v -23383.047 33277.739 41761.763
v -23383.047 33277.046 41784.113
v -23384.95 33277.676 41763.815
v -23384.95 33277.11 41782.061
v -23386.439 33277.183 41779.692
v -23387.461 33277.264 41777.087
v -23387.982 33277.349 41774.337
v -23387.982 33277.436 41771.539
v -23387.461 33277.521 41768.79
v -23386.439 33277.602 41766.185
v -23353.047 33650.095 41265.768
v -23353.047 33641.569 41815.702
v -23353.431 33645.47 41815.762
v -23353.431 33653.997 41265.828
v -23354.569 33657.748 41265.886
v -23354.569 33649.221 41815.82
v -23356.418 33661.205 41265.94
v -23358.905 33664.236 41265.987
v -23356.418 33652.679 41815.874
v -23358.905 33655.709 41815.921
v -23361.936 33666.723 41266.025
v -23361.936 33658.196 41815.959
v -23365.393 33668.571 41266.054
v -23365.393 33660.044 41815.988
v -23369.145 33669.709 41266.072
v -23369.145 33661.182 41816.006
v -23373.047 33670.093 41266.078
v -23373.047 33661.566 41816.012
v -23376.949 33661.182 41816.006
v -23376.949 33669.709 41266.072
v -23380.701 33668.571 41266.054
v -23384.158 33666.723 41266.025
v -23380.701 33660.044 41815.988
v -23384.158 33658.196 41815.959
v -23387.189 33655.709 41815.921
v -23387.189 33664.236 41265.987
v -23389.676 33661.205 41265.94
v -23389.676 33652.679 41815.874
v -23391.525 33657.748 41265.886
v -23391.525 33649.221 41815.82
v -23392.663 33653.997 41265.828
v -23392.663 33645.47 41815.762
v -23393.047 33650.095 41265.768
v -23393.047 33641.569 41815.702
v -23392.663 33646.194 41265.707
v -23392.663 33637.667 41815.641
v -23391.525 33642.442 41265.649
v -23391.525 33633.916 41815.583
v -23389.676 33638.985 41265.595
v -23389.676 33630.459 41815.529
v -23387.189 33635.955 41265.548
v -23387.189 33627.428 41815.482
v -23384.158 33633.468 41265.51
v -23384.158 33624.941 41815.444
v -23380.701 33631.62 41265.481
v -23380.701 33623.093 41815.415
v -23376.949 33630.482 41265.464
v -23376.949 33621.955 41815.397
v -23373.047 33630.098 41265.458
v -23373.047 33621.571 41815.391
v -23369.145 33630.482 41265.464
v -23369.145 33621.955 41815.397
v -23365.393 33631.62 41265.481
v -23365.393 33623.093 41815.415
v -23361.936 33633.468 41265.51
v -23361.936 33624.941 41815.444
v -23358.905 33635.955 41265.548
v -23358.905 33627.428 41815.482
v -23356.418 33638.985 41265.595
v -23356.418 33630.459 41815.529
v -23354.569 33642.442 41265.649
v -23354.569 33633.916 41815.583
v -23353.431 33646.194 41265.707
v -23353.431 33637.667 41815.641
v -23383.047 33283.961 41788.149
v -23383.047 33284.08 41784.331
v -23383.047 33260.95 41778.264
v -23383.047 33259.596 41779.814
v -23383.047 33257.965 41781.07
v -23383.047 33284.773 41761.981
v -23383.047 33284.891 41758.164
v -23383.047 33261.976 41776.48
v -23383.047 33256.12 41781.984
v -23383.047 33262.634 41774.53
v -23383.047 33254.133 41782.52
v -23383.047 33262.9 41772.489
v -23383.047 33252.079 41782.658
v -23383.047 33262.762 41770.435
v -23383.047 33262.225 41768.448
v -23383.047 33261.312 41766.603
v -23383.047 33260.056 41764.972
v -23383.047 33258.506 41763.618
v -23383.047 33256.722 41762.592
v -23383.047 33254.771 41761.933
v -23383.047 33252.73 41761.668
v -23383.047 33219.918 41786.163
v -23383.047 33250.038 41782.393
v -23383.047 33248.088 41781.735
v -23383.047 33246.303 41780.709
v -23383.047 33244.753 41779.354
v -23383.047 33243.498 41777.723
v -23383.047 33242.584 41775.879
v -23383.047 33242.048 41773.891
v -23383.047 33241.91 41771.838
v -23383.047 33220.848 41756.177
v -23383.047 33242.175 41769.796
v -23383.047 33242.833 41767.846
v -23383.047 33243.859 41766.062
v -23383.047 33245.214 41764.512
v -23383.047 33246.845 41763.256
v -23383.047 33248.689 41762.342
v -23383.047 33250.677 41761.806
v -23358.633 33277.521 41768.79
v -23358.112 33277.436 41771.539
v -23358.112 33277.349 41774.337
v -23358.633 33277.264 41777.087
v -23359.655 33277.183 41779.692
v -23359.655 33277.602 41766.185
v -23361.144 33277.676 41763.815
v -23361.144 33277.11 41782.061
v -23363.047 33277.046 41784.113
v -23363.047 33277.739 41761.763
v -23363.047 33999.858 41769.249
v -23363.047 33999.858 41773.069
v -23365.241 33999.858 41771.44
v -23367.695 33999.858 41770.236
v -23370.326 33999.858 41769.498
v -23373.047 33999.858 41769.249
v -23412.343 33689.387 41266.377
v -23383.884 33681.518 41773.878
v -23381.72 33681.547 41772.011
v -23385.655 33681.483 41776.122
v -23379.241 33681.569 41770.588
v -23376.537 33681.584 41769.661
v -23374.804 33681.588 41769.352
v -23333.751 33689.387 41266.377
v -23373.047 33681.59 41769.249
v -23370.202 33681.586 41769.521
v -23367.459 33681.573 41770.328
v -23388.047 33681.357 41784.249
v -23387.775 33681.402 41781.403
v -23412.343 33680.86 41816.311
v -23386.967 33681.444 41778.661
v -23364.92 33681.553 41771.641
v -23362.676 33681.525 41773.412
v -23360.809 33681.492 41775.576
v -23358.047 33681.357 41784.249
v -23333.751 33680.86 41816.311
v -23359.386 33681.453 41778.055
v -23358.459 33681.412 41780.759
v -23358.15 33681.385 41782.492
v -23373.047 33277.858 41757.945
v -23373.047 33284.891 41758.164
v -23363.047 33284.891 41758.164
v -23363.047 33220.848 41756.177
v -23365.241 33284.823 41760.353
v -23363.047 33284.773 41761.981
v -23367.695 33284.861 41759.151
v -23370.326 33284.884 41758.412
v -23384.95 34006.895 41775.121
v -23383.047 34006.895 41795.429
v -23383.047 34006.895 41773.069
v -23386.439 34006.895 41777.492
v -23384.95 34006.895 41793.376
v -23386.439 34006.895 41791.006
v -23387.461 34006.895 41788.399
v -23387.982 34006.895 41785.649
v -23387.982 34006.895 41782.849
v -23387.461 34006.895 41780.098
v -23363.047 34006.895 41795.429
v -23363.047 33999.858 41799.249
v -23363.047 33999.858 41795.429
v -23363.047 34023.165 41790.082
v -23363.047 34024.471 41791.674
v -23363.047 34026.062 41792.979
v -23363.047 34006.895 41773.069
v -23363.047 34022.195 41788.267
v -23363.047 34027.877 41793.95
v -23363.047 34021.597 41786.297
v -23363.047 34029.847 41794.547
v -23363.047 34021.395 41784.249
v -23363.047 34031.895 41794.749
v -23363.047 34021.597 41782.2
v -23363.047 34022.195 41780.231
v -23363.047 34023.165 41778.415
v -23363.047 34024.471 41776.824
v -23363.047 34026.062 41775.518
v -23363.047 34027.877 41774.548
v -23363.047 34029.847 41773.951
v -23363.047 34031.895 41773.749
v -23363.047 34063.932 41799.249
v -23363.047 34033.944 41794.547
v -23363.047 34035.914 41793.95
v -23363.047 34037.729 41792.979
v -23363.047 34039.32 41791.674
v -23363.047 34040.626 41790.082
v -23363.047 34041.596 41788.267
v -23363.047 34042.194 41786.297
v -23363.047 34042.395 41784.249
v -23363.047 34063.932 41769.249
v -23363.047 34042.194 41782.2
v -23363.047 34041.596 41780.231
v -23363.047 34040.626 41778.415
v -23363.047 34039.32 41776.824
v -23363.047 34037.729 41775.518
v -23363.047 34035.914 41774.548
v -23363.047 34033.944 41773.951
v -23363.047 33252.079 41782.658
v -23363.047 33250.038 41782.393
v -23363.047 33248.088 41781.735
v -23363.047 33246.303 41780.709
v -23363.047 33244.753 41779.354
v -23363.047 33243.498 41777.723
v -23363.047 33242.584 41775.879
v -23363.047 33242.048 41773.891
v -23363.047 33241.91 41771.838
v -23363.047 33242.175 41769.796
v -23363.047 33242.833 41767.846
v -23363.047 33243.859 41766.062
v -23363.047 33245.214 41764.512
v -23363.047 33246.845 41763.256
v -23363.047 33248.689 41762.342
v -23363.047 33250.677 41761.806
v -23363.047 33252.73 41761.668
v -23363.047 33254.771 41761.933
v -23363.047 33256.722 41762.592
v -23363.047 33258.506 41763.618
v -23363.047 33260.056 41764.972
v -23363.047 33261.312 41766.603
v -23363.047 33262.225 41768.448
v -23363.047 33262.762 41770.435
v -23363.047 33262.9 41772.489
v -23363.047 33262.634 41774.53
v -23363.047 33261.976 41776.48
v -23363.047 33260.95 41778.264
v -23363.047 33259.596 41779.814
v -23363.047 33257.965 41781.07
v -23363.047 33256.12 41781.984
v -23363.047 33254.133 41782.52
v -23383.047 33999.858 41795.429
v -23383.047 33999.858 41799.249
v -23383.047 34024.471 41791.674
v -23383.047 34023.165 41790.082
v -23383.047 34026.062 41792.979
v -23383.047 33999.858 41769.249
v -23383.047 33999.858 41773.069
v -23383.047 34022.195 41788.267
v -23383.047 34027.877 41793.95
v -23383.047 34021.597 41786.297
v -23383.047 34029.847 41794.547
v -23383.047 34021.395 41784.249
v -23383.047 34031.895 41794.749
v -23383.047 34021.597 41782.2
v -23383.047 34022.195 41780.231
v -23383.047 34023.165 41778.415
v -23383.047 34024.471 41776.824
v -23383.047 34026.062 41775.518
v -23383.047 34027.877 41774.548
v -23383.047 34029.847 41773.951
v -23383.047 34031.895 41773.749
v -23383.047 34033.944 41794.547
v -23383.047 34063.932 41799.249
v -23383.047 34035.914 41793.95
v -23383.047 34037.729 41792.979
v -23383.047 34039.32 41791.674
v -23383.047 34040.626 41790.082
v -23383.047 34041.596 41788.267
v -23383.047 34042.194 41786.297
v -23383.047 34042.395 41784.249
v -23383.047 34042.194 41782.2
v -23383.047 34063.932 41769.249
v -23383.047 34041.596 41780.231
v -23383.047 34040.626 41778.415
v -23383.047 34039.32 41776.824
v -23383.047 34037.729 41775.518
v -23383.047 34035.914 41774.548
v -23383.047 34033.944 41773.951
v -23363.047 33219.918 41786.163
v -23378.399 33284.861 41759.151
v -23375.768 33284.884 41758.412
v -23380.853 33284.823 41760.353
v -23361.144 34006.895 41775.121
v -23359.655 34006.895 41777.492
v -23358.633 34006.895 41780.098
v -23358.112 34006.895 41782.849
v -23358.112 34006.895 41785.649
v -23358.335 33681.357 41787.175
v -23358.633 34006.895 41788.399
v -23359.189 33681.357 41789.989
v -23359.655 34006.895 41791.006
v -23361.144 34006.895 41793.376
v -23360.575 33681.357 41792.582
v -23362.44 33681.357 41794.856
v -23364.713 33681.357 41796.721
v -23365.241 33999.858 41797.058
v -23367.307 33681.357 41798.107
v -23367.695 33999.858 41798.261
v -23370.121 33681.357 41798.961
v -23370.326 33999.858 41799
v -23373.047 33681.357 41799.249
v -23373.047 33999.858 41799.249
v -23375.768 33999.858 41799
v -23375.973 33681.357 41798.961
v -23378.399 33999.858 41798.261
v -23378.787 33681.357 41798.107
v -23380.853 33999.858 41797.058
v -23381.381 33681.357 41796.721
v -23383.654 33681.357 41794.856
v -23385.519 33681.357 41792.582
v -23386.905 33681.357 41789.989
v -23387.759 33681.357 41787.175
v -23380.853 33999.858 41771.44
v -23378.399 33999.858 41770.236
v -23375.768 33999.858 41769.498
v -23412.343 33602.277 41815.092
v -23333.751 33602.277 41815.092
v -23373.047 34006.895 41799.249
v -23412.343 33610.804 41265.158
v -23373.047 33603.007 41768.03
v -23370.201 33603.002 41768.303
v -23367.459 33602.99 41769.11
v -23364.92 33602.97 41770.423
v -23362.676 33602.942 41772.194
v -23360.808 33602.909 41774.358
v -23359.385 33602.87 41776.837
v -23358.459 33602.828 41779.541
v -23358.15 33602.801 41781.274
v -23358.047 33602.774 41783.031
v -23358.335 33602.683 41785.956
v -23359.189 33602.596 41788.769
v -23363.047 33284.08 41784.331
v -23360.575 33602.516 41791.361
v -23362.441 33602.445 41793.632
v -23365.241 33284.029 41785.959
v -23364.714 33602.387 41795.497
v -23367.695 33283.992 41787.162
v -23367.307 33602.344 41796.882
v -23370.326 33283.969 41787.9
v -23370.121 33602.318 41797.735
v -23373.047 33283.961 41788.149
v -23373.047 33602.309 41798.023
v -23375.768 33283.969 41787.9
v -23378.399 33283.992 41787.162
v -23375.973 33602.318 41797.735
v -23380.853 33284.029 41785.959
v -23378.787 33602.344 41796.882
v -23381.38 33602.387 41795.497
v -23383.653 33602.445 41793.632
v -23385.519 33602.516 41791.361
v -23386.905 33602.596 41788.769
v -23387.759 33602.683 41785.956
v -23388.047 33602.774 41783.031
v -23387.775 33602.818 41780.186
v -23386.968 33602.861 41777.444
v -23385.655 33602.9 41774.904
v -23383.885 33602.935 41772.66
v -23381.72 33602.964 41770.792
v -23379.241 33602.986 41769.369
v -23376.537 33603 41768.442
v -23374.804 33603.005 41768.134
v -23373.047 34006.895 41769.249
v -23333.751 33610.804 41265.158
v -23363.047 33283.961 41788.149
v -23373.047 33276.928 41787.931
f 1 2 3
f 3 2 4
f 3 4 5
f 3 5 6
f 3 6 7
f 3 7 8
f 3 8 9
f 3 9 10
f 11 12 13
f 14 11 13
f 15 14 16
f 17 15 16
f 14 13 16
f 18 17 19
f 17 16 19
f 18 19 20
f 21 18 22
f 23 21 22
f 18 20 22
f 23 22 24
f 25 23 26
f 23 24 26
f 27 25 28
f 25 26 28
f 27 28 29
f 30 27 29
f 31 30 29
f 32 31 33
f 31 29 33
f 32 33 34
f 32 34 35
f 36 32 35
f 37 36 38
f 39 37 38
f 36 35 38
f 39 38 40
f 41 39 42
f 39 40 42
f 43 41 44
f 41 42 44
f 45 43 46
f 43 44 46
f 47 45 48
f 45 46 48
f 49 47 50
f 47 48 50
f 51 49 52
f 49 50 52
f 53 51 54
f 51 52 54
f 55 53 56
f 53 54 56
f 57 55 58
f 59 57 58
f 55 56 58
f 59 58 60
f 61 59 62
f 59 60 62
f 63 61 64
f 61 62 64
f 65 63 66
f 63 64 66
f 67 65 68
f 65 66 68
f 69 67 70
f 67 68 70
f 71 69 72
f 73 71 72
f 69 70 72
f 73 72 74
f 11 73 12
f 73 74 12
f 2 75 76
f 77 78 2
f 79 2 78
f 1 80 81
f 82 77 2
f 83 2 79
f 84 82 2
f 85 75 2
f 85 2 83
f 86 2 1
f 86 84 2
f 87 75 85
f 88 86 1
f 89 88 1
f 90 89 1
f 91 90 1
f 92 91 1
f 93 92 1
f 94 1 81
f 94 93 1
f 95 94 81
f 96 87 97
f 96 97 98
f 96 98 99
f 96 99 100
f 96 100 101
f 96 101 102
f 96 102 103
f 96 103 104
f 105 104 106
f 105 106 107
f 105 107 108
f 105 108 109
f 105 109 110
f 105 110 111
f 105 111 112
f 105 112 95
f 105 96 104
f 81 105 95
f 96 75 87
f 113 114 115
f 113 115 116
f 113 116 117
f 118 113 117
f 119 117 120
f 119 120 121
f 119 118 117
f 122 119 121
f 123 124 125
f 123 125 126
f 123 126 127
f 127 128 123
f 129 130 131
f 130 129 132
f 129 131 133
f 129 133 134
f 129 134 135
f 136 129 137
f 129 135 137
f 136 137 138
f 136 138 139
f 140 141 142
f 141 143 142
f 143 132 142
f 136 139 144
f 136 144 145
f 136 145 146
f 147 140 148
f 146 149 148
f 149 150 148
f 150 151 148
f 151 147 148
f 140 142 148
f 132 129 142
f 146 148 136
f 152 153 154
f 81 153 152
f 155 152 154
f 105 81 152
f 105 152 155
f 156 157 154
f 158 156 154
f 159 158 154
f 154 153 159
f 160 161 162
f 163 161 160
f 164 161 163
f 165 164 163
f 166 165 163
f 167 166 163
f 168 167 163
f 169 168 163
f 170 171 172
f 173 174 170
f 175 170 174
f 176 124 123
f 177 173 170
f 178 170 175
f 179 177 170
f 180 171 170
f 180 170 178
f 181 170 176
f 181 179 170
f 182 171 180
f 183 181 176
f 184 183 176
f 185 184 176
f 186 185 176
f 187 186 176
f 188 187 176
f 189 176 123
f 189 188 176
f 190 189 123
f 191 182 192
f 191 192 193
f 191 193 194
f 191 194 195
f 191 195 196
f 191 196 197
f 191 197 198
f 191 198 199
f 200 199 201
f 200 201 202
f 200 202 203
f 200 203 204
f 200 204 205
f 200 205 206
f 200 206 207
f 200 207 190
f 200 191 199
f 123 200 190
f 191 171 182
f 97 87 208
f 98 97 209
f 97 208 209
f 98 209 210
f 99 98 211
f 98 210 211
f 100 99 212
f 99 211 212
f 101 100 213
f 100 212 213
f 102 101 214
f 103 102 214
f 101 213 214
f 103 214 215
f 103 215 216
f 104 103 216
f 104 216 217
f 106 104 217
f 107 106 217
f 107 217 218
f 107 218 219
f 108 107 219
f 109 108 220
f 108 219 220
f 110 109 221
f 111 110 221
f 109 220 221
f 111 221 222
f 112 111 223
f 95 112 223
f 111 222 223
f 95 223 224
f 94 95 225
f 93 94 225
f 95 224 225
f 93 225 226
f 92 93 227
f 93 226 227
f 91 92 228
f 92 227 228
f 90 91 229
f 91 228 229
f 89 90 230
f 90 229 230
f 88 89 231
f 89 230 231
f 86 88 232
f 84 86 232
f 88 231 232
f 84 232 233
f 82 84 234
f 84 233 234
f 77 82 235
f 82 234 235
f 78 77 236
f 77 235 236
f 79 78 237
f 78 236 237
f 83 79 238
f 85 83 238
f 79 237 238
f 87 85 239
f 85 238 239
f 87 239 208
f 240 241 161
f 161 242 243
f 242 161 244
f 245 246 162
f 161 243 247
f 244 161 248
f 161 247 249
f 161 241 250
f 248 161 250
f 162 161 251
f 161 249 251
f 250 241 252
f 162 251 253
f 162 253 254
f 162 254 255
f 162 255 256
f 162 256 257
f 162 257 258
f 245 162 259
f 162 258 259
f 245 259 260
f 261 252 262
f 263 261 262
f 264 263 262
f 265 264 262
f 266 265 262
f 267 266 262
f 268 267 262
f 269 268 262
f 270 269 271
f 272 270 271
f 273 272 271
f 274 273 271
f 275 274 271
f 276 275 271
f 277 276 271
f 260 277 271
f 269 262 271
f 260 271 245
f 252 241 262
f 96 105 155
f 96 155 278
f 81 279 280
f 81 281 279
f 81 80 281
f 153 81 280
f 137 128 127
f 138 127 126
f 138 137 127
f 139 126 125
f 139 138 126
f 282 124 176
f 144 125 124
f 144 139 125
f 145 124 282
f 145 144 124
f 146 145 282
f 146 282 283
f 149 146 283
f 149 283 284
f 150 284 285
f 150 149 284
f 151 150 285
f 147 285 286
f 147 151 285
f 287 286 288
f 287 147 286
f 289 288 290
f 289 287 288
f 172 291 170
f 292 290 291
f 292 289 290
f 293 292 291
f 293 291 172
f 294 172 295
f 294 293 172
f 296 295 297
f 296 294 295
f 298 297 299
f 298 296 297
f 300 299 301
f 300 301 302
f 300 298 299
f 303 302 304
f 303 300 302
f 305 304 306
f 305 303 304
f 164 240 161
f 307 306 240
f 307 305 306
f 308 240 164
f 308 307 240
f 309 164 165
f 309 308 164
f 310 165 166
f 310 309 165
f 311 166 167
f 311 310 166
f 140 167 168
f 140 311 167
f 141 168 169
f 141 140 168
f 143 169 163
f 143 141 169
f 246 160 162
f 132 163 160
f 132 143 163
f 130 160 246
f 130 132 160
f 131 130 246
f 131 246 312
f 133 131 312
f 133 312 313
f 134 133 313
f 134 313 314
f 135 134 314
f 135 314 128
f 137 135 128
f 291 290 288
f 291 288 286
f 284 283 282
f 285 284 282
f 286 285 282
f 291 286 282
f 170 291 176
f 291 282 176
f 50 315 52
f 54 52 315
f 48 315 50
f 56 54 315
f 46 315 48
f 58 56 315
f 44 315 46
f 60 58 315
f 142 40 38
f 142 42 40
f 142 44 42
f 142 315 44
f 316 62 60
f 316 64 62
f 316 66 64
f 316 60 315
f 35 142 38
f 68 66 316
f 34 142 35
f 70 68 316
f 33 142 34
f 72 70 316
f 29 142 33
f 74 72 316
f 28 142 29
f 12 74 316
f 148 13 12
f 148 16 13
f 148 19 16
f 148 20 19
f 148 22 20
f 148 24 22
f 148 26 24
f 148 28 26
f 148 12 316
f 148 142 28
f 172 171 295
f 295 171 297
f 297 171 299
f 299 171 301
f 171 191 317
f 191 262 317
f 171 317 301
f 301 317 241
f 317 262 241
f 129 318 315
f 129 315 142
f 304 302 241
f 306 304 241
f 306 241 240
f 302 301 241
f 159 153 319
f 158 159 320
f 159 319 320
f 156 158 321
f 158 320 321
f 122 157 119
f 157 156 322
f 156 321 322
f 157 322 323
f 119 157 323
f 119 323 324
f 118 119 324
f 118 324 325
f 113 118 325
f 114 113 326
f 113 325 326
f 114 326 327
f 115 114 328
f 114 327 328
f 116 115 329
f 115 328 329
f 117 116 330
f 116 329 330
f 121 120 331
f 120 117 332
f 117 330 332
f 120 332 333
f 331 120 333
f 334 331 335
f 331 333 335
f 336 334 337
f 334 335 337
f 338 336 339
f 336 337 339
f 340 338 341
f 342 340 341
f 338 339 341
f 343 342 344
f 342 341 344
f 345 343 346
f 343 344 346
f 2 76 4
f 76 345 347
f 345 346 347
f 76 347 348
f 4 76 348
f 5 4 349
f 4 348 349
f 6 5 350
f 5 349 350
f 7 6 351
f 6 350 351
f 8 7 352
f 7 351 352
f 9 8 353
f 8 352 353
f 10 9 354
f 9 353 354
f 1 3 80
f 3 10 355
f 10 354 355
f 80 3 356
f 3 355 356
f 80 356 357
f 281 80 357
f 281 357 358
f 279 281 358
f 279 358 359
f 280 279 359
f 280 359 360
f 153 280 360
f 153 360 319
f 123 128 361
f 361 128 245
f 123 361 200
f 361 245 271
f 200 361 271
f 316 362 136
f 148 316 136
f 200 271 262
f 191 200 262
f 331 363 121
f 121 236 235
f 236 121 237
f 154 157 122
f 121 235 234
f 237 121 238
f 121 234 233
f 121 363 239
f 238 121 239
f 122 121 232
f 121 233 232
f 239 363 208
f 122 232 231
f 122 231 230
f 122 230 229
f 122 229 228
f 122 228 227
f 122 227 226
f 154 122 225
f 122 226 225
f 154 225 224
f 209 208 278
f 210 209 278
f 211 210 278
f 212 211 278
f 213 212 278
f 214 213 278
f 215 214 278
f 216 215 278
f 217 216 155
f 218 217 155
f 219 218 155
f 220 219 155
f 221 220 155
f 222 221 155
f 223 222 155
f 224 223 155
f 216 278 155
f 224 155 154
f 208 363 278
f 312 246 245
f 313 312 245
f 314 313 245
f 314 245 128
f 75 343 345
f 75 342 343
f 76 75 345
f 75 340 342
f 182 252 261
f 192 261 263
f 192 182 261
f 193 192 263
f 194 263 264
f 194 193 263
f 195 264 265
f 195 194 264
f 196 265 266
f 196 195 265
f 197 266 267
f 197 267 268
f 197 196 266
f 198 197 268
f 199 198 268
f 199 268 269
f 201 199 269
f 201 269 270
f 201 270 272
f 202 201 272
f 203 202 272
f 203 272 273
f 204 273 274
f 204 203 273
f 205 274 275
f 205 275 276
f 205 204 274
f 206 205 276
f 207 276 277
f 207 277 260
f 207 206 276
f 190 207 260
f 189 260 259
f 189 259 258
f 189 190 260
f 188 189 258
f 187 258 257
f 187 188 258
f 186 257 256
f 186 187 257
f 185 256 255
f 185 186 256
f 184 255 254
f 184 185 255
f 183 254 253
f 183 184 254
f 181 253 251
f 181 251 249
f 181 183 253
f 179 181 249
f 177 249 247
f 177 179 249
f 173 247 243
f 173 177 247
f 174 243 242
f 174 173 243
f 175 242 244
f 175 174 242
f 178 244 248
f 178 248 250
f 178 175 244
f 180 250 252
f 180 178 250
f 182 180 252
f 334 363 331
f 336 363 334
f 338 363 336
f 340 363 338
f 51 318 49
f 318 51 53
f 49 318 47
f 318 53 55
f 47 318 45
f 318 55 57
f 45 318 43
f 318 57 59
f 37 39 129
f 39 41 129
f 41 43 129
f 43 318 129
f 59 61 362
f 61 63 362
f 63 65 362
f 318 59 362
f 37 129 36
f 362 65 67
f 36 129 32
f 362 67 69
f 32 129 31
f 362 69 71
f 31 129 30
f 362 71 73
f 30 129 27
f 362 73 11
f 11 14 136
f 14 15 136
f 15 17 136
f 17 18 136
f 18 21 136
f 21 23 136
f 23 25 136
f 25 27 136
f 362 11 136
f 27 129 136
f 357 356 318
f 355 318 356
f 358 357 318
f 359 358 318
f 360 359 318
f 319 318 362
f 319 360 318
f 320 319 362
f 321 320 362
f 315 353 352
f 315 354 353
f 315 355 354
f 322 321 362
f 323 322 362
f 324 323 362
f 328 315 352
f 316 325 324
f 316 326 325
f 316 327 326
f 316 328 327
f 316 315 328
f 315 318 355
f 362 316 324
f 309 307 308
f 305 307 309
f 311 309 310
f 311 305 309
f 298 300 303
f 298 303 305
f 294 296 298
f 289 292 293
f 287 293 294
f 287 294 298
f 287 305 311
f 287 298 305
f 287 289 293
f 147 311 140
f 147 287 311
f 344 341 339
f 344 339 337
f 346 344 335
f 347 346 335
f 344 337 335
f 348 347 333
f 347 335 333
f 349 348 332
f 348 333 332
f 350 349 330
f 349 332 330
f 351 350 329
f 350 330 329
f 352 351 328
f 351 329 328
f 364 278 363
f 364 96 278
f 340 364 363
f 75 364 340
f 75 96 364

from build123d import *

# Parameters (mm, degrees)
SKETCH1_W           = 78.592769499
SKETCH1_H           = 78.592769498
SKETCH1_R           = 20
BOSS_EXTRUDE4_DEPTH = 550
SWEEP1_PROFILE_R    = 15
SKETCH15_R          = 10.5
BOSS_EXTRUDE5_DEPTH = 10


with BuildPart() as part:
    # Sketch1 → Boss-Extrude4 (new body)
    with BuildSketch(Plane(origin=(4e-09, 27232.877627093, 41716.336726155), x_dir=(1, 0, 0), z_dir=(0, -0.01550283, 0.999879824))):
        with Locations((-23373.04698752, 6409.461295652)):
            Rectangle(SKETCH1_W, SKETCH1_H)
        with Locations((-23373.046987519, 6409.461295652)):
            Circle(SKETCH1_R, mode=Mode.SUBTRACT)
    extrude(amount=-BOSS_EXTRUDE4_DEPTH)

    # Sweep1: sweep along a curve in space
    with BuildLine() as sweep1_path:
        Line((-23373.046987515, 34006.895340042, 41784.248904534), (-23373.046987515, 33681.357429633, 41784.248904534))
    # Sweep1 profile (on start of the path) → Sweep1 (sweep)
    with BuildSketch(Plane(origin=(-23373.046987515, 34006.895340042, 41784.248904534), x_dir=(0, 0, -1), z_dir=(0, -1, 0))):
        Circle(SWEEP1_PROFILE_R)
    sweep1 = sweep(path=sweep1_path.line)

    # Sketch15 → Boss-Extrude5 (add, symmetric)
    with BuildSketch(Plane(origin=(-23373.046987519, 0, 3e-09), x_dir=(0, 0, 1), z_dir=(-1, 0, 0))):
        Polygon((41769.248904556, 34063.932408428), (41799.248904531, 34063.932408428), (41799.248904531, 33999.858271629), (41769.248904531, 33999.858271629), align=None)
        with Locations((41784.248904537, 34031.895340042)):
            Circle(SKETCH15_R, mode=Mode.SUBTRACT)
    boss_extrude5 = extrude(amount=BOSS_EXTRUDE5_DEPTH, both=True)

    # Mirror1: Sweep1, Boss-Extrude5 across plane
    add(sweep1.mirror(Plane(origin=(0, 34281.667133734, 531.526740505), x_dir=(0, -0.01550283, 0.999879824), z_dir=(0, -0.999879824, -0.01550283))))
    add(boss_extrude5.mirror(Plane(origin=(0, 34281.667133734, 531.526740505), x_dir=(0, -0.01550283, 0.999879824), z_dir=(0, -0.999879824, -0.01550283))))


solid = part.part
